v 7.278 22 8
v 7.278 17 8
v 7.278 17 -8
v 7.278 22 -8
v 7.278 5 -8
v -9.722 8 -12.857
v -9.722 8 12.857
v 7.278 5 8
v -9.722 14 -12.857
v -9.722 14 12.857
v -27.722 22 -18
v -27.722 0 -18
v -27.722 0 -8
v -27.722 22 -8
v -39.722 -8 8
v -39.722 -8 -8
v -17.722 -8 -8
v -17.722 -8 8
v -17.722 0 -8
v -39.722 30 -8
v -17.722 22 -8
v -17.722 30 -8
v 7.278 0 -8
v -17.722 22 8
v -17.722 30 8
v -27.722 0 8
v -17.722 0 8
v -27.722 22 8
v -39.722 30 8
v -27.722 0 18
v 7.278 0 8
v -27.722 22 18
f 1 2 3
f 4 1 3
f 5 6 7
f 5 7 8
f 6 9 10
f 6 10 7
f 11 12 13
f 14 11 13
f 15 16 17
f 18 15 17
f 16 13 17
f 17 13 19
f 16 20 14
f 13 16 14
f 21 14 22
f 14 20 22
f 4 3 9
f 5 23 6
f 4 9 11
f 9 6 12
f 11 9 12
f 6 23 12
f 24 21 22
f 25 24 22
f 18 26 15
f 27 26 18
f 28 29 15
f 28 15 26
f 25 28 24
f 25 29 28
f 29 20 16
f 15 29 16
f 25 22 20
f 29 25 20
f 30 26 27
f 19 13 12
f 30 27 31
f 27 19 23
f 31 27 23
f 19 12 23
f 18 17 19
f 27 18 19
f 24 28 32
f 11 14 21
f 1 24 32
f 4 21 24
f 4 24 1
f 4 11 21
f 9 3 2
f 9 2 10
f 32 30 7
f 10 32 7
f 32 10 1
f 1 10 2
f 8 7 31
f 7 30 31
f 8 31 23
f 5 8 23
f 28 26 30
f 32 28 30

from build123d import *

# Parameters (mm, degrees)
BOSS_EXTRUDE1_DEPTH      = 22
CUT_EXTRUDE1_DEPTH       = 40.705228033
CUT_EXTRUDE1_DEPTH_BACK  = 40.705228033
BOSS_EXTRUDE2_DEPTH      = 8
BOSS_EXTRUDE2_DEPTH_BACK = 8


with BuildPart() as part:
    # Sketch1 → Boss-Extrude1 (new body)
    with BuildSketch(Plane(origin=(0, 0, 0), x_dir=(1, 0, 0), z_dir=(0, 1, 0))):
        Polygon((-27.721925134, 18), (-27.721925134, -18), (7.278074866, -8), (7.278074866, 8), align=None)
    extrude(amount=BOSS_EXTRUDE1_DEPTH)

    # Sketch2 → Cut-Extrude1 (cut, two sides: drawn at the far end of the back side and taken through both)
    with BuildSketch(Plane.XY.offset(-CUT_EXTRUDE1_DEPTH_BACK)):
        Polygon((-9.721925134, 14), (-9.721925134, 8), (7.278074866, 5), (7.278074866, 17), align=None)
    extrude(amount=CUT_EXTRUDE1_DEPTH + CUT_EXTRUDE1_DEPTH_BACK, mode=Mode.SUBTRACT)

    # Sketch3 → Boss-Extrude2 (add, two sides: drawn at the far end of the back side and taken through both)
    with BuildSketch(Plane.XY.offset(-BOSS_EXTRUDE2_DEPTH_BACK)):
        Polygon((-39.721925134, 30), (-39.721925134, -8), (-17.721925134, -8), (-17.721925134, 0), (-27.721925134, 0), (-27.721925134, 22), (-17.721925134, 22), (-17.721925134, 30), align=None)
    extrude(amount=BOSS_EXTRUDE2_DEPTH + BOSS_EXTRUDE2_DEPTH_BACK)


solid = part.part
